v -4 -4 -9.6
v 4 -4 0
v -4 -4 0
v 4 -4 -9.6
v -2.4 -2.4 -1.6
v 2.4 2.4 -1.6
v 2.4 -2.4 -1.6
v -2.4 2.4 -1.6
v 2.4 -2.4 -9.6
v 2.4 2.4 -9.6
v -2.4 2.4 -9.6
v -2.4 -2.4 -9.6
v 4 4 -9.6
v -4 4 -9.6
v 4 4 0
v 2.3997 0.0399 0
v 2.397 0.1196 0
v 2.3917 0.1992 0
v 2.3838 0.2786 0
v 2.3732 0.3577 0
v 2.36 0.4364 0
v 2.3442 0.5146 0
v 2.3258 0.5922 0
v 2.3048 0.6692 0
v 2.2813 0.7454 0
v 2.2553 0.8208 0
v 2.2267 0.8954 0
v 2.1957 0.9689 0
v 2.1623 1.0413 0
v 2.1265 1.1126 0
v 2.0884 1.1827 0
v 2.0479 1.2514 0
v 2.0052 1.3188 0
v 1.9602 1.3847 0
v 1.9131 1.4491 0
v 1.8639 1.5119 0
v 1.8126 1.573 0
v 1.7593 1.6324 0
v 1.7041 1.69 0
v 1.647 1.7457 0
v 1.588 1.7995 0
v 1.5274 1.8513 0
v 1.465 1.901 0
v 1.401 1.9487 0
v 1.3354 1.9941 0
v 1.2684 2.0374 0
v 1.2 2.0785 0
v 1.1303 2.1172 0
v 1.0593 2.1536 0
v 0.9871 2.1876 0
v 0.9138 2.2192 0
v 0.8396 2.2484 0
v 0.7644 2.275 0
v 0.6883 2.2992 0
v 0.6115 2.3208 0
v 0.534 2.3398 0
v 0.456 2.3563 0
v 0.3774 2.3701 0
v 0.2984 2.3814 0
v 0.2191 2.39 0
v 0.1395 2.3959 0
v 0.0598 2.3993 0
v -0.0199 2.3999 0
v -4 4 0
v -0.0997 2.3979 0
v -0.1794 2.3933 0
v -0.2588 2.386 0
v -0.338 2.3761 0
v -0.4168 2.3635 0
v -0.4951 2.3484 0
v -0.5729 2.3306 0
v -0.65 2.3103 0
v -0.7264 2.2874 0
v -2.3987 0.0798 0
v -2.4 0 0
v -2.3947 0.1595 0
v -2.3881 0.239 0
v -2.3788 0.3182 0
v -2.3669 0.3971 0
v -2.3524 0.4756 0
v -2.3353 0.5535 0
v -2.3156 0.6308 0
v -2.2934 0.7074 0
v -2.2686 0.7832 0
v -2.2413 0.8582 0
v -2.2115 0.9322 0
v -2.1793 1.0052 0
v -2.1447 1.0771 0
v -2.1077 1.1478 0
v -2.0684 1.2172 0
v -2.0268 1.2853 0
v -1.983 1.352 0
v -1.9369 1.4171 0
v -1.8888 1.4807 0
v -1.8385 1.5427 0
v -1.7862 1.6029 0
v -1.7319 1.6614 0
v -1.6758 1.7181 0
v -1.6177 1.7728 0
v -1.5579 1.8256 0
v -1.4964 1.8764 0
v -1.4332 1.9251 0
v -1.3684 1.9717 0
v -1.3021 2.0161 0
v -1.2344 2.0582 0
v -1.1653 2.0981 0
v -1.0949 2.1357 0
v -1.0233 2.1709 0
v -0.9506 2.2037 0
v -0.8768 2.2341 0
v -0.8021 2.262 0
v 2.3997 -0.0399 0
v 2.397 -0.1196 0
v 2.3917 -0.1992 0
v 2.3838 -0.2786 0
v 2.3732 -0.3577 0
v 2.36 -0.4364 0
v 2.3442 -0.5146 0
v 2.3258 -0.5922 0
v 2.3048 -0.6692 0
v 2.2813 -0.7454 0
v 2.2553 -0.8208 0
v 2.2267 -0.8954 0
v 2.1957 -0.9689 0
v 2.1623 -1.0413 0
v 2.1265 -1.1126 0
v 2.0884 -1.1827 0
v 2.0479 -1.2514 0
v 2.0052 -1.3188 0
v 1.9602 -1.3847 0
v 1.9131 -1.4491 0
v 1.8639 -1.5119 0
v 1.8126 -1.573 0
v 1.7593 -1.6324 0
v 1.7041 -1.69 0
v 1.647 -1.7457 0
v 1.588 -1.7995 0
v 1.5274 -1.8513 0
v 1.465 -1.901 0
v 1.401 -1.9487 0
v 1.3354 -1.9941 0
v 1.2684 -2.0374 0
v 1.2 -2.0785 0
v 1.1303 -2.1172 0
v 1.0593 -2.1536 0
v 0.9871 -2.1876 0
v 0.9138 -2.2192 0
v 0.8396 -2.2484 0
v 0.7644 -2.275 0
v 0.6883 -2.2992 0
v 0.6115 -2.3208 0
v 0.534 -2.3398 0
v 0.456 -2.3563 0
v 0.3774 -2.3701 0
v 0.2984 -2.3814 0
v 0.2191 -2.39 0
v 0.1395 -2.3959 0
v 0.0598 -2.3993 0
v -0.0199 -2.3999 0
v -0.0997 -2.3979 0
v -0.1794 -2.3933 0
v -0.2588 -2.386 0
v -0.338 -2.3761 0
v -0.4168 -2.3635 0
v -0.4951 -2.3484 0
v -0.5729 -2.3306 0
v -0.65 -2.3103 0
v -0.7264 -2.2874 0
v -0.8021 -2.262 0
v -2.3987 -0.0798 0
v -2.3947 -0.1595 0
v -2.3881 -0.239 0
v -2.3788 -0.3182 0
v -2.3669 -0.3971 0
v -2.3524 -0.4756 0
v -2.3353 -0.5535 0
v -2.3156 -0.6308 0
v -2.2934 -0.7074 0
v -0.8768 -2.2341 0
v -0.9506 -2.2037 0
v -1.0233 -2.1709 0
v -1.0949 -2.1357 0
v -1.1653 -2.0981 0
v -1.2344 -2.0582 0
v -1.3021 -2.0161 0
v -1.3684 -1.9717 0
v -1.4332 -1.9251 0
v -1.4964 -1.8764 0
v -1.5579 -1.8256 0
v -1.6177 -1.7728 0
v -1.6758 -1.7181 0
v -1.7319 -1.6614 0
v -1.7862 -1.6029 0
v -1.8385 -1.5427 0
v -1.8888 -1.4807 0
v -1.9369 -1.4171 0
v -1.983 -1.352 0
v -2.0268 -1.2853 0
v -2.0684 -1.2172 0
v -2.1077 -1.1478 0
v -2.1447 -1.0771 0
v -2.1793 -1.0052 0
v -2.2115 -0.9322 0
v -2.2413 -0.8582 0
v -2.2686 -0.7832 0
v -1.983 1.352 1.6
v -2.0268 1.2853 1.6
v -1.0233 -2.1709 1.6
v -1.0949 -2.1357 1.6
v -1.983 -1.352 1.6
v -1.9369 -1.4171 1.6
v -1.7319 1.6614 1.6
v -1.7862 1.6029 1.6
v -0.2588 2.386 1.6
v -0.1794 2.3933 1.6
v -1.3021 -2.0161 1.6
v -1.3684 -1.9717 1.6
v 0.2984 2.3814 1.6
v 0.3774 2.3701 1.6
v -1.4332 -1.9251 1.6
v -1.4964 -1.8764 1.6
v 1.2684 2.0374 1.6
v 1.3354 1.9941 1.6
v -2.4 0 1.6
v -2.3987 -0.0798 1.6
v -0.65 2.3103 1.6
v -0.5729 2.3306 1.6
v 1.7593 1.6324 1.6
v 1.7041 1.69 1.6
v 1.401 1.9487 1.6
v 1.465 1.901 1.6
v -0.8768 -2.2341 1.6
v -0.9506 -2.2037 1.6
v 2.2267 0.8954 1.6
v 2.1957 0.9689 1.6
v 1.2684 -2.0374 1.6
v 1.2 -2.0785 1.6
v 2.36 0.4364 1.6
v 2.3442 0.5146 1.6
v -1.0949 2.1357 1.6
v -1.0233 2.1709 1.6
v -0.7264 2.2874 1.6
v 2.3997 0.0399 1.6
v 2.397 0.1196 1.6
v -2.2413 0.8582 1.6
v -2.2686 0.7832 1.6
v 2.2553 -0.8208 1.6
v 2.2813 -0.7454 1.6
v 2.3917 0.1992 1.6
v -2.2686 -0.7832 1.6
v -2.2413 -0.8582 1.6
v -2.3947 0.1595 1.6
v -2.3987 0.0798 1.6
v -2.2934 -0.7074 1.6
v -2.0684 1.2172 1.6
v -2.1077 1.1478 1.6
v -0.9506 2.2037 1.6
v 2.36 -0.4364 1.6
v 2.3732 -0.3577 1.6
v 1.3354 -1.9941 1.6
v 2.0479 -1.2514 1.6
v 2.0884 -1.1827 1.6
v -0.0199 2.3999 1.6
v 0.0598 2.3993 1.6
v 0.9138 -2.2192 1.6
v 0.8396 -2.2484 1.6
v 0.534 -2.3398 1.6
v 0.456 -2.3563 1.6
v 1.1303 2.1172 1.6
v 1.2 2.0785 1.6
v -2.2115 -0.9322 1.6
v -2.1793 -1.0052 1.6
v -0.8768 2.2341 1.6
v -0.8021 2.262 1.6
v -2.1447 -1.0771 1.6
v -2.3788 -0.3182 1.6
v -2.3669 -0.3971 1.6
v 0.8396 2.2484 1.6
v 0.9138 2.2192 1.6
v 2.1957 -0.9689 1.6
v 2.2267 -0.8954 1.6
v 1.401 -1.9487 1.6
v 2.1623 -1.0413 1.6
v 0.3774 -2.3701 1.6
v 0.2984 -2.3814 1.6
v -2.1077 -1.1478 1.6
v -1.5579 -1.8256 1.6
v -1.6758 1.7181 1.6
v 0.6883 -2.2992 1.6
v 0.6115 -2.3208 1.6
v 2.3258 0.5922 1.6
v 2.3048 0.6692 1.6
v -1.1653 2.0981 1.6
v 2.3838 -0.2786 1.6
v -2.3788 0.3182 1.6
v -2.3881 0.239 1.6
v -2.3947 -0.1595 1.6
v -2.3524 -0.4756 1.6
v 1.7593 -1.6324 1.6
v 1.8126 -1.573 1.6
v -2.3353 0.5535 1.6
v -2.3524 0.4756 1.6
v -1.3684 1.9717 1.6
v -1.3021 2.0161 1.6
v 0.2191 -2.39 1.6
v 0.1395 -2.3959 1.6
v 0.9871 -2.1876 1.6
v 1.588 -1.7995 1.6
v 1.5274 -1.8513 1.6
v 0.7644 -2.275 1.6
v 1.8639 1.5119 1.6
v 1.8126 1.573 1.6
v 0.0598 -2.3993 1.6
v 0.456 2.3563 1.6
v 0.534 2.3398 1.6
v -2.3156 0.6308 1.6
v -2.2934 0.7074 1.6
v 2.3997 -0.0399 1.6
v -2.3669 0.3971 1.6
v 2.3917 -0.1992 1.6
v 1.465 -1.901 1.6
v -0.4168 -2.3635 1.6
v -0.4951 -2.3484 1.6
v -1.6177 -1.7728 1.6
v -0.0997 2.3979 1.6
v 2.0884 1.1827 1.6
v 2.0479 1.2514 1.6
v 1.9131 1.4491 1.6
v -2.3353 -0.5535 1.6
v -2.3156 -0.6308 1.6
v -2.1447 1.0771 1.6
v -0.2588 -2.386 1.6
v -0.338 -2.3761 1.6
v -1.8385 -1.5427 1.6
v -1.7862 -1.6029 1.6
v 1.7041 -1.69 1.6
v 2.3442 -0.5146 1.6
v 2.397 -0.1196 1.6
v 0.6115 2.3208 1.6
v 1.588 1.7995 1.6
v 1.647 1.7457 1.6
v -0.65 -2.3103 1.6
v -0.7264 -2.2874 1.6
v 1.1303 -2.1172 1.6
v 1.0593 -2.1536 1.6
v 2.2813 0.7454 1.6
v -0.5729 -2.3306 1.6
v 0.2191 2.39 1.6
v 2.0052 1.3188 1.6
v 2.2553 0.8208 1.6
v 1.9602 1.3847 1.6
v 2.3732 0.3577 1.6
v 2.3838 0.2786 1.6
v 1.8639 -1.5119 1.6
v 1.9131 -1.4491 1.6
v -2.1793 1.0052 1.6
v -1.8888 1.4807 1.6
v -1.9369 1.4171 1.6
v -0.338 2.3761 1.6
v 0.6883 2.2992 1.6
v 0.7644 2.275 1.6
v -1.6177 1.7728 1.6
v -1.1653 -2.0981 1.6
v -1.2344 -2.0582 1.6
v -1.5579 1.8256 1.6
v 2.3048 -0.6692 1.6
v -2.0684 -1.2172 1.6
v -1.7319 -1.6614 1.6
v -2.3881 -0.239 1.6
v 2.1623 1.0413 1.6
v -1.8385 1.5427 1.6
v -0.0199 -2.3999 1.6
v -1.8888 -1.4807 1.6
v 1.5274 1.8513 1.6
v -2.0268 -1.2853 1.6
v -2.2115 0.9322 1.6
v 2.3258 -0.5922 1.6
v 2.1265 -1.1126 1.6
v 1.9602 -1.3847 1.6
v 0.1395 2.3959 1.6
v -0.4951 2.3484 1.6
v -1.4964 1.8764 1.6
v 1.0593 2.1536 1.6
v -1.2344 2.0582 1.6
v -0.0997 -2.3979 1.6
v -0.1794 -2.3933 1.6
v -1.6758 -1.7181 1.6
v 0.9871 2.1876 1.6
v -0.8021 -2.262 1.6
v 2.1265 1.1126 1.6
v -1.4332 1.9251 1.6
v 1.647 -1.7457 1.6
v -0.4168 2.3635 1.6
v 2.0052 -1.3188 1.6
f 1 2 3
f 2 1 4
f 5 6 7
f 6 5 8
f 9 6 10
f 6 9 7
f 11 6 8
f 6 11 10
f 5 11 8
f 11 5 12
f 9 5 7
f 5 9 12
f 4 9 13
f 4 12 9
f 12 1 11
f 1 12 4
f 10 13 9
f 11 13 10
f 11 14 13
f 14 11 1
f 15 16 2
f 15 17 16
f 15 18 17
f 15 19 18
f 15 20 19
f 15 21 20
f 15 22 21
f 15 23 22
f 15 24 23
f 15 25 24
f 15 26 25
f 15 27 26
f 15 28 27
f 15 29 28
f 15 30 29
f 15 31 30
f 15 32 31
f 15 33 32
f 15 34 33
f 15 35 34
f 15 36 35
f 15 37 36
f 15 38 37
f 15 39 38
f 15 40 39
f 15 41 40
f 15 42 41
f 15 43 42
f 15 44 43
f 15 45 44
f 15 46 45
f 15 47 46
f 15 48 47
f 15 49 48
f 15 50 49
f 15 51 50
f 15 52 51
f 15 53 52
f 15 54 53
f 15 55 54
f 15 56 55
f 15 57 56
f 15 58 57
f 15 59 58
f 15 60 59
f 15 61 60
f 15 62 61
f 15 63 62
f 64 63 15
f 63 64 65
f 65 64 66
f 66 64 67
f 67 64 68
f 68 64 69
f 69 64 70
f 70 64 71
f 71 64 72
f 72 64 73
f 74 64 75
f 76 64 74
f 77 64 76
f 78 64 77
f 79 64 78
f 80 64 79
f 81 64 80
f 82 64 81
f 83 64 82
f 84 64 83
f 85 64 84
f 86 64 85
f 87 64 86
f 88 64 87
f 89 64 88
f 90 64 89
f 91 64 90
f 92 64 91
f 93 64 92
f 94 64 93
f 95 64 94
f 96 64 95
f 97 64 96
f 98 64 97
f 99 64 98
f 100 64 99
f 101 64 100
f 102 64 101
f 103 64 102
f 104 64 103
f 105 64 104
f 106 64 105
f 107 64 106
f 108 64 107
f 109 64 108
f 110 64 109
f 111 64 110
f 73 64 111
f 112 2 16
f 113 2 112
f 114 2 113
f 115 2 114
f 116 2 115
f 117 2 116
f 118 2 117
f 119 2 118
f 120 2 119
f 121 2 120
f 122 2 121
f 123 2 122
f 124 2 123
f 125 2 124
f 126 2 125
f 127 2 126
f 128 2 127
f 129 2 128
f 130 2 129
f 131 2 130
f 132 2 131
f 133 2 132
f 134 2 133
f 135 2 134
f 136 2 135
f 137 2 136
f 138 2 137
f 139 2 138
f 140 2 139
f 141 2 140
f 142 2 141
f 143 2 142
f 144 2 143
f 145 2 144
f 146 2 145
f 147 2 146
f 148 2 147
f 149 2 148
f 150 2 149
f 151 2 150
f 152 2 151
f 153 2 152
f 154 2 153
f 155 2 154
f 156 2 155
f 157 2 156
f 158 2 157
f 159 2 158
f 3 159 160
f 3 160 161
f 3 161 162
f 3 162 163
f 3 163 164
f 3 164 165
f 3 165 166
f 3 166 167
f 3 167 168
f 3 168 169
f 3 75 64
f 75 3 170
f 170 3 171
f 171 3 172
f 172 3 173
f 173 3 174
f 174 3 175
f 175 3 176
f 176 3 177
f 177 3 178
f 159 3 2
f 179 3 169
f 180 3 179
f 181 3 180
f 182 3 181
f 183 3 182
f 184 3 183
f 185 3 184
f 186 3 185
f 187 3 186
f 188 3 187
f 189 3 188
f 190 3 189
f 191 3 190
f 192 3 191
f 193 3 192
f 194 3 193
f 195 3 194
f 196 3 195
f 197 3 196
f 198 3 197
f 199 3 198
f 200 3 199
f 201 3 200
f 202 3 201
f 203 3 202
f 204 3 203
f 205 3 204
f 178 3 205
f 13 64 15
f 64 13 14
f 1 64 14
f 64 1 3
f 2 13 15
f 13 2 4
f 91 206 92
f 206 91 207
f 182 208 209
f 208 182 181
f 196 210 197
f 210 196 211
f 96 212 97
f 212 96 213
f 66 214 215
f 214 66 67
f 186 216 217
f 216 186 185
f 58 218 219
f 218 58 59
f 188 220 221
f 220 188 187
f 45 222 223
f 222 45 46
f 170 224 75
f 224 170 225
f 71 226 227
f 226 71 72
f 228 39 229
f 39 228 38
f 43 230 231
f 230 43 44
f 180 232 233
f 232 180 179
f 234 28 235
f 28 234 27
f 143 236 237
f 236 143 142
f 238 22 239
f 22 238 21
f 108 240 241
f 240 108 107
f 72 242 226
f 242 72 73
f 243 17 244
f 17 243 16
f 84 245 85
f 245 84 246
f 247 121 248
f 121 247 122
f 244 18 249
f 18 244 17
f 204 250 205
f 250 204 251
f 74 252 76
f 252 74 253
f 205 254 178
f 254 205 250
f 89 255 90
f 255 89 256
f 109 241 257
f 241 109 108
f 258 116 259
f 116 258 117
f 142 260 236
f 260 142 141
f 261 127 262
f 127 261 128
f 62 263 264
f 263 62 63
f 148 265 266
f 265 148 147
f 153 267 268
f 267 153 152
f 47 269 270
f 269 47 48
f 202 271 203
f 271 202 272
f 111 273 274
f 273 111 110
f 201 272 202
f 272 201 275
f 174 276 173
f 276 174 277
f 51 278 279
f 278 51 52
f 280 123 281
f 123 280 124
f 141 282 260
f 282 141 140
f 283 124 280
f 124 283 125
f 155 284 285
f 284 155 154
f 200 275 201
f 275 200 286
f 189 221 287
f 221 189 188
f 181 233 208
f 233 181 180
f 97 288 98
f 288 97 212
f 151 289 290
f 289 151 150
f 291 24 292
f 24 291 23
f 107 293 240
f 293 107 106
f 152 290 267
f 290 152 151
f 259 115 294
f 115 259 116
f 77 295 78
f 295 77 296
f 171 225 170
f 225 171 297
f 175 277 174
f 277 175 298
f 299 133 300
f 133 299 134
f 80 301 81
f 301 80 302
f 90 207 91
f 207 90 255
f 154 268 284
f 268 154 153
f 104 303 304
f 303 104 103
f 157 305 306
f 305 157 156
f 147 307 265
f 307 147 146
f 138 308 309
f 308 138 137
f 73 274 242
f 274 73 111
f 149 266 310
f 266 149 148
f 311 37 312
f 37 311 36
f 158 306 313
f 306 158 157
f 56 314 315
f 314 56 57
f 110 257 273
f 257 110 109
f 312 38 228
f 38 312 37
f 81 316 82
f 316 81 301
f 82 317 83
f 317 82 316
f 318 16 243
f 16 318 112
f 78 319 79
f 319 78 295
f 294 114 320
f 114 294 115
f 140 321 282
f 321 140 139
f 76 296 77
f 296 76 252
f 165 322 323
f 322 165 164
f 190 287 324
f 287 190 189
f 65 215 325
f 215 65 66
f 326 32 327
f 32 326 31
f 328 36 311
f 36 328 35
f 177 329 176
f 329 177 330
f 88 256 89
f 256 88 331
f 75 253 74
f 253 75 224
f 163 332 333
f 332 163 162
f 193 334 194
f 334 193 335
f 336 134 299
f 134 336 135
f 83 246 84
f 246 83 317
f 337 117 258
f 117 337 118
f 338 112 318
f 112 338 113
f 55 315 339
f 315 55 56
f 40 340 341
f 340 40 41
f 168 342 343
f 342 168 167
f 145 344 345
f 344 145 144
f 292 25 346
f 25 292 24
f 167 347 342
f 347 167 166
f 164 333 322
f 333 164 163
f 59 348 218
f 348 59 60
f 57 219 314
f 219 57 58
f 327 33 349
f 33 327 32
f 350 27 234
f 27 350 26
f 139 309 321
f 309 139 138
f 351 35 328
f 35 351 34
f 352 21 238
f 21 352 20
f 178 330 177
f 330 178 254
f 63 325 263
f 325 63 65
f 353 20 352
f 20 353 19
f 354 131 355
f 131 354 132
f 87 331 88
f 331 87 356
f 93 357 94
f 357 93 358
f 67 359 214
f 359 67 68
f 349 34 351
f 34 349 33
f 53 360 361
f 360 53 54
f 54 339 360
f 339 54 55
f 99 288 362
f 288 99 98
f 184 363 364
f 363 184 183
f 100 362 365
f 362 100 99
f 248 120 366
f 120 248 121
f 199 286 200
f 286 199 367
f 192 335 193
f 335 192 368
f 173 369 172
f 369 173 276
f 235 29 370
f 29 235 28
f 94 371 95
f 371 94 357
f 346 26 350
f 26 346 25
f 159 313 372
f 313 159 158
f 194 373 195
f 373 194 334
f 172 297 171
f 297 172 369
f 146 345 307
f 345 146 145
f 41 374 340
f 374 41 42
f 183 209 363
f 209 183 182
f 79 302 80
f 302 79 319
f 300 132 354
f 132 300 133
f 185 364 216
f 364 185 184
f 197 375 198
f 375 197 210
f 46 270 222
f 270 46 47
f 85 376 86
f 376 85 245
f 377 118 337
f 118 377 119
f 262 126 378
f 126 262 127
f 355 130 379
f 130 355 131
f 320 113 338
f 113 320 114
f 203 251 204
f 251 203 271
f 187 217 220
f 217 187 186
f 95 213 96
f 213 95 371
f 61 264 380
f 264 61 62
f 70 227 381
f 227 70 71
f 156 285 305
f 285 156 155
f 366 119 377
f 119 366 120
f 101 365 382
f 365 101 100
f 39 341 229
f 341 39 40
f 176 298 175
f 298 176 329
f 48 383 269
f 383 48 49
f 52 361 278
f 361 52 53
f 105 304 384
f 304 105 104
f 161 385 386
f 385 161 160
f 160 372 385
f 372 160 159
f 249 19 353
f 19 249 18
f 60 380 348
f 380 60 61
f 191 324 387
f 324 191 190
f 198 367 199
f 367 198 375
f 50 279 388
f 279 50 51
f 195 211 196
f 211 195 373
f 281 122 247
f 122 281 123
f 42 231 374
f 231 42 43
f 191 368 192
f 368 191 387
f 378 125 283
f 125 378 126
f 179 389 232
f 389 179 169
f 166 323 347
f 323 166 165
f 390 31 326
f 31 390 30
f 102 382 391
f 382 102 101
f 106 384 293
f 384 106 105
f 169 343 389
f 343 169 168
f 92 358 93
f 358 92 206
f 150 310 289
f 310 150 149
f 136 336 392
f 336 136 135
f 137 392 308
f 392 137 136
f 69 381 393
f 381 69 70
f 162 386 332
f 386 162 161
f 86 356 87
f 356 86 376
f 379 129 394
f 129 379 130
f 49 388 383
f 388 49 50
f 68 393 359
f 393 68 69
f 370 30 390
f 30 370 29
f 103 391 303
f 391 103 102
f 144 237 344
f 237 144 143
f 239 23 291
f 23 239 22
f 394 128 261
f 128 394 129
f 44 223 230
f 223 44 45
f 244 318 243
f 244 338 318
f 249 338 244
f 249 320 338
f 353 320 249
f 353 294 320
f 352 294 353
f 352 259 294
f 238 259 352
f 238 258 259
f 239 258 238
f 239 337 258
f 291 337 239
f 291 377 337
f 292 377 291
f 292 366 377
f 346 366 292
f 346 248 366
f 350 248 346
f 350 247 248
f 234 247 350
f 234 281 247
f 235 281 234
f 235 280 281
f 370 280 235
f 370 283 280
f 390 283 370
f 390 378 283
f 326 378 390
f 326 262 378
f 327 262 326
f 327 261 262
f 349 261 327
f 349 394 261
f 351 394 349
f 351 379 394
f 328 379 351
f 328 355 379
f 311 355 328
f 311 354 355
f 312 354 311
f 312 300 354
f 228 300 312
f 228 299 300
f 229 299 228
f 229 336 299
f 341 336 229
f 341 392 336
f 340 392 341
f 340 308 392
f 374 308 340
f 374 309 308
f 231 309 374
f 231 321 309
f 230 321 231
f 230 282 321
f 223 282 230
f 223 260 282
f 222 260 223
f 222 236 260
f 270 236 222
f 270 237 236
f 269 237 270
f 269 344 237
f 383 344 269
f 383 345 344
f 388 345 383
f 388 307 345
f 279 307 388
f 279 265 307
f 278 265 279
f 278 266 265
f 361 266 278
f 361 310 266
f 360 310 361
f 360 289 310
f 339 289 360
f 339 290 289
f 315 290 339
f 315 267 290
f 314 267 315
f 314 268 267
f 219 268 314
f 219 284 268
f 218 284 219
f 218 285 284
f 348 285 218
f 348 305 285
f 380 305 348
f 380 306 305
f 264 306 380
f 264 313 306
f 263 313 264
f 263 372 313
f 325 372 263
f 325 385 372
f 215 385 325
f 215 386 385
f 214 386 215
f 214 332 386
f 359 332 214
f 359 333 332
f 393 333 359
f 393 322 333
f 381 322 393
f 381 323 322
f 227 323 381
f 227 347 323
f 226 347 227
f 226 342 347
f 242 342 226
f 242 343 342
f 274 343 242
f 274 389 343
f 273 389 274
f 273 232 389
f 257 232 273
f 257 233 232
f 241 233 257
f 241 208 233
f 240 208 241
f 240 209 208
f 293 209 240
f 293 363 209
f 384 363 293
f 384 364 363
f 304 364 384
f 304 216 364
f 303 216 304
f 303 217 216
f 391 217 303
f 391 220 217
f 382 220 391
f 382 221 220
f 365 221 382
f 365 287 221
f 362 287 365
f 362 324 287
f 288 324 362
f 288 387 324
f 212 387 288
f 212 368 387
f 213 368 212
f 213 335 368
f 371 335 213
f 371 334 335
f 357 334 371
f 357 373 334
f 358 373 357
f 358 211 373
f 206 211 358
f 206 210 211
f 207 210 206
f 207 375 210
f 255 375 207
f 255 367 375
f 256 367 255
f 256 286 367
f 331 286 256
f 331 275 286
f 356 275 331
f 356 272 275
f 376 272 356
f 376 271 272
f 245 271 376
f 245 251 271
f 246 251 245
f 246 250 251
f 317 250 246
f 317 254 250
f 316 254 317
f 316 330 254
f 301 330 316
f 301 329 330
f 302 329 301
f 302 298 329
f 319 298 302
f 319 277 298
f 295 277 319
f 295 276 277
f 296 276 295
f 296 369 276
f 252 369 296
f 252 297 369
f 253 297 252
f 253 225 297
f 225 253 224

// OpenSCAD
// file: ../p/4-4edge.scad
use <../lib.scad>
$fa=1; $fs=0.2;
function ldraw_lib__4_4edge(realsolid=false) = [
// 0 Circle 1.0
// 0 Name: 4-4edge.dat
// 0 Author: James Jessiman
// 0 !LDRAW_ORG Primitive UPDATE 2017-01
// 0 !LICENSE Licensed under CC BY 2.0 and CC BY 4.0 : see CAreadme.txt
// 
// 0 BFC CERTIFY CCW
  [0,"BFC","CERTIFY"],
  [0,"BFC","CCW"],
// 
// 0 !HISTORY 1998-12-15 [PTadmin] Official Update 1998-10
// 0 !HISTORY 2005-12-28 [PTadmin] Official Update 2005-01
// 0 !HISTORY 2007-06-24 [PTadmin] Header formatted for Contributor Agreement
// 0 !HISTORY 2008-07-01 [PTadmin] Official Update 2008-01
// 0 !HISTORY 2017-01-15 [Steffen] BFCed
// 0 !HISTORY 2017-12-30 [PTadmin] Official Update 2017-01
// 
// 
// 2 24 1 0 0 0.9239 0 0.3827
  [2,24,1,0,0,0.9239,0,0.3827],
// 2 24 0.9239 0 0.3827 0.7071 0 0.7071
  [2,24,0.9239,0,0.3827,0.7071,0,0.7071],
// 2 24 0.7071 0 0.7071 0.3827 0 0.9239
  [2,24,0.7071,0,0.7071,0.3827,0,0.9239],
// 2 24 0.3827 0 0.9239 0 0 1
  [2,24,0.3827,0,0.9239,0,0,1],
// 2 24 0 0 1 -0.3827 0 0.9239
  [2,24,0,0,1,-0.3827,0,0.9239],
// 2 24 -0.3827 0 0.9239 -0.7071 0 0.7071
  [2,24,-0.3827,0,0.9239,-0.7071,0,0.7071],
// 2 24 -0.7071 0 0.7071 -0.9239 0 0.3827
  [2,24,-0.7071,0,0.7071,-0.9239,0,0.3827],
// 2 24 -0.9239 0 0.3827 -1 0 -0
  [2,24,-0.9239,0,0.3827,-1,0,-0],
// 2 24 -1 0 -0 -0.9239 0 -0.3827
  [2,24,-1,0,-0,-0.9239,0,-0.3827],
// 2 24 -0.9239 0 -0.3827 -0.7071 0 -0.7071
  [2,24,-0.9239,0,-0.3827,-0.7071,0,-0.7071],
// 2 24 -0.7071 0 -0.7071 -0.3827 0 -0.9239
  [2,24,-0.7071,0,-0.7071,-0.3827,0,-0.9239],
// 2 24 -0.3827 0 -0.9239 0 0 -1
  [2,24,-0.3827,0,-0.9239,0,0,-1],
// 2 24 0 0 -1 0.3827 0 -0.9239
  [2,24,0,0,-1,0.3827,0,-0.9239],
// 2 24 0.3827 0 -0.9239 0.7071 0 -0.7071
  [2,24,0.3827,0,-0.9239,0.7071,0,-0.7071],
// 2 24 0.7071 0 -0.7071 0.9239 0 -0.3827
  [2,24,0.7071,0,-0.7071,0.9239,0,-0.3827],
// 2 24 0.9239 0 -0.3827 1 0 0
  [2,24,0.9239,0,-0.3827,1,0,0],
];
module ldraw_lib__4_4edge(step=0, col=false, unit=2/5, alt=false, line=0.2, solid=!$preview)
    makepoly(ldraw_lib__4_4edge(solid), step=step, col=col, unit=unit, alt=alt, line=line, solid=solid);
ldraw_lib__4_4edge(line=0.2);
// file: ../p/4-4disc.scad
use <../lib.scad>
$fa=1; $fs=0.2;
function ldraw_lib__4_4disc(realsolid=false) = [
// 0 Disc 1.0
// 0 Name: 4-4disc.dat
// 0 Author: James Jessiman
// 0 !LDRAW_ORG Primitive UPDATE 2002-02
// 0 !LICENSE Licensed under CC BY 2.0 and CC BY 4.0 : see CAreadme.txt
// 
// 0 BFC CERTIFY CCW
  [0,"BFC","CERTIFY"],
  [0,"BFC","CCW"],
// 
// 0 !HISTORY 1998-12-15 [PTadmin] Official Update 1998-10
// 0 !HISTORY 2002-03-23 [sbliss] Added BFC statement
// 0 !HISTORY 2002-04-25 [PTadmin] Official Update 2002-02
// 0 !HISTORY 2007-06-24 [PTadmin] Header formatted for Contributor Agreement
// 0 !HISTORY 2008-07-01 [PTadmin] Official Update 2008-01
// 
// 
// 3 16 0 0 0 1 0 0 0.9239 0 0.3827
  [3,16,0,0,0,1,0,0,0.9239,0,0.3827],
// 3 16 0 0 0 0.9239 0 0.3827 0.7071 0 0.7071
  [3,16,0,0,0,0.9239,0,0.3827,0.7071,0,0.7071],
// 3 16 0 0 0 0.7071 0 0.7071 0.3827 0 0.9239
  [3,16,0,0,0,0.7071,0,0.7071,0.3827,0,0.9239],
// 3 16 0 0 0 0.3827 0 0.9239 0 0 1
  [3,16,0,0,0,0.3827,0,0.9239,0,0,1],
// 3 16 0 0 0 0 0 1 -0.3827 0 0.9239
  [3,16,0,0,0,0,0,1,-0.3827,0,0.9239],
// 3 16 0 0 0 -0.3827 0 0.9239 -0.7071 0 0.7071
  [3,16,0,0,0,-0.3827,0,0.9239,-0.7071,0,0.7071],
// 3 16 0 0 0 -0.7071 0 0.7071 -0.9239 0 0.3827
  [3,16,0,0,0,-0.7071,0,0.7071,-0.9239,0,0.3827],
// 3 16 0 0 0 -0.9239 0 0.3827 -1 0 -0
  [3,16,0,0,0,-0.9239,0,0.3827,-1,0,-0],
// 3 16 0 0 0 -1 0 -0 -0.9239 0 -0.3827
  [3,16,0,0,0,-1,0,-0,-0.9239,0,-0.3827],
// 3 16 0 0 0 -0.9239 0 -0.3827 -0.7071 0 -0.7071
  [3,16,0,0,0,-0.9239,0,-0.3827,-0.7071,0,-0.7071],
// 3 16 0 0 0 -0.7071 0 -0.7071 -0.3827 0 -0.9239
  [3,16,0,0,0,-0.7071,0,-0.7071,-0.3827,0,-0.9239],
// 3 16 0 0 0 -0.3827 0 -0.9239 0 0 -1
  [3,16,0,0,0,-0.3827,0,-0.9239,0,0,-1],
// 3 16 0 0 0 0 0 -1 0.3827 0 -0.9239
  [3,16,0,0,0,0,0,-1,0.3827,0,-0.9239],
// 3 16 0 0 0 0.3827 0 -0.9239 0.7071 0 -0.7071
  [3,16,0,0,0,0.3827,0,-0.9239,0.7071,0,-0.7071],
// 3 16 0 0 0 0.7071 0 -0.7071 0.9239 0 -0.3827
  [3,16,0,0,0,0.7071,0,-0.7071,0.9239,0,-0.3827],
// 3 16 0 0 0 0.9239 0 -0.3827 1 0 0
  [3,16,0,0,0,0.9239,0,-0.3827,1,0,0],
// 0
];
module ldraw_lib__4_4disc(step=0, col=false, unit=2/5, alt=false, line=0.2, solid=!$preview)
    makepoly(ldraw_lib__4_4disc(solid), step=step, col=col, unit=unit, alt=alt, line=line, solid=solid);
ldraw_lib__4_4disc(line=0.2);
// file: ../p/4-4cyli.scad
use <../lib.scad>
$fa=1; $fs=0.2;
function ldraw_lib__4_4cyli(realsolid=false) = [
// 0 Cylinder 1.0
// 0 Name: 4-4cyli.dat
// 0 Author: James Jessiman
// 0 !LDRAW_ORG Primitive UPDATE 2005-01
// 0 !LICENSE Licensed under CC BY 2.0 and CC BY 4.0 : see CAreadme.txt
// 
// 0 BFC CERTIFY CCW
  [0,"BFC","CERTIFY"],
  [0,"BFC","CCW"],
// 
// 0 !HISTORY 1998-12-15 [PTadmin] Official Update 1998-10
// 0 !HISTORY 2002-03-23 [sbliss] Added BFC statement; merged headers from files in distributions LDraw 0.27 and Complete.
// 0 !HISTORY 2002-04-25 [PTadmin] Official Update 2002-02
// 0 !HISTORY 2004-12-14 [guyvivan] BFC CCW
// 0 !HISTORY 2005-12-28 [PTadmin] Official Update 2005-01
// 0 !HISTORY 2007-06-24 [PTadmin] Header formatted for Contributor Agreement
// 0 !HISTORY 2008-07-01 [PTadmin] Official Update 2008-01
// 
// 
// 4 16 1 1 0 0.9239 1 0.3827 0.9239 0 0.3827 1 0 0
  [4,16,1,1,0,0.9239,1,0.3827,0.9239,0,0.3827,1,0,0],
// 5 24 1 0 0 1 1 0 0.9239 0 0.3827 0.9239 0 -0.3827
  [5,24,1,0,0,1,1,0,0.9239,0,0.3827,0.9239,0,-0.3827],
// 4 16 0.9239 1 0.3827 0.7071 1 0.7071 0.7071 0 0.7071 0.9239 0 0.3827
  [4,16,0.9239,1,0.3827,0.7071,1,0.7071,0.7071,0,0.7071,0.9239,0,0.3827],
// 5 24 0.9239 0 0.3827 0.9239 1 0.3827 0.7071 0 0.7071 1 0 0
  [5,24,0.9239,0,0.3827,0.9239,1,0.3827,0.7071,0,0.7071,1,0,0],
// 4 16 0.7071 1 0.7071 0.3827 1 0.9239 0.3827 0 0.9239 0.7071 0 0.7071
  [4,16,0.7071,1,0.7071,0.3827,1,0.9239,0.3827,0,0.9239,0.7071,0,0.7071],
// 5 24 0.7071 0 0.7071 0.7071 1 0.7071 0.3827 0 0.9239 0.9239 0 0.3827
  [5,24,0.7071,0,0.7071,0.7071,1,0.7071,0.3827,0,0.9239,0.9239,0,0.3827],
// 4 16 0.3827 1 0.9239 0 1 1 0 0 1 0.3827 0 0.9239
  [4,16,0.3827,1,0.9239,0,1,1,0,0,1,0.3827,0,0.9239],
// 5 24 0.3827 0 0.9239 0.3827 1 0.9239 0 0 1 0.7071 0 0.7071
  [5,24,0.3827,0,0.9239,0.3827,1,0.9239,0,0,1,0.7071,0,0.7071],
// 4 16 0 1 1 -0.3827 1 0.9239 -0.3827 0 0.9239 0 0 1
  [4,16,0,1,1,-0.3827,1,0.9239,-0.3827,0,0.9239,0,0,1],
// 5 24 0 0 1 0 1 1 -0.3827 0 0.9239 0.3827 0 0.9239
  [5,24,0,0,1,0,1,1,-0.3827,0,0.9239,0.3827,0,0.9239],
// 4 16 -0.3827 1 0.9239 -0.7071 1 0.7071 -0.7071 0 0.7071 -0.3827 0 0.9239
  [4,16,-0.3827,1,0.9239,-0.7071,1,0.7071,-0.7071,0,0.7071,-0.3827,0,0.9239],
// 5 24 -0.3827 0 0.9239 -0.3827 1 0.9239 -0.7071 0 0.7071 0 0 1
  [5,24,-0.3827,0,0.9239,-0.3827,1,0.9239,-0.7071,0,0.7071,0,0,1],
// 4 16 -0.7071 1 0.7071 -0.9239 1 0.3827 -0.9239 0 0.3827 -0.7071 0 0.7071
  [4,16,-0.7071,1,0.7071,-0.9239,1,0.3827,-0.9239,0,0.3827,-0.7071,0,0.7071],
// 5 24 -0.7071 0 0.7071 -0.7071 1 0.7071 -0.9239 0 0.3827 -0.3827 0 0.9239
  [5,24,-0.7071,0,0.7071,-0.7071,1,0.7071,-0.9239,0,0.3827,-0.3827,0,0.9239],
// 4 16 -0.9239 1 0.3827 -1 1 0 -1 0 0 -0.9239 0 0.3827
  [4,16,-0.9239,1,0.3827,-1,1,0,-1,0,0,-0.9239,0,0.3827],
// 5 24 -0.9239 0 0.3827 -0.9239 1 0.3827 -1 0 0 -0.7071 0 0.7071
  [5,24,-0.9239,0,0.3827,-0.9239,1,0.3827,-1,0,0,-0.7071,0,0.7071],
// 4 16 -1 1 0 -0.9239 1 -0.3827 -0.9239 0 -0.3827 -1 0 0
  [4,16,-1,1,0,-0.9239,1,-0.3827,-0.9239,0,-0.3827,-1,0,0],
// 5 24 -1 0 0 -1 1 0 -0.9239 0 -0.3827 -0.9239 0 0.3827
  [5,24,-1,0,0,-1,1,0,-0.9239,0,-0.3827,-0.9239,0,0.3827],
// 4 16 -0.9239 1 -0.3827 -0.7071 1 -0.7071 -0.7071 0 -0.7071 -0.9239 0 -0.3827
  [4,16,-0.9239,1,-0.3827,-0.7071,1,-0.7071,-0.7071,0,-0.7071,-0.9239,0,-0.3827],
// 5 24 -0.9239 0 -0.3827 -0.9239 1 -0.3827 -0.7071 0 -0.7071 -1 0 0
  [5,24,-0.9239,0,-0.3827,-0.9239,1,-0.3827,-0.7071,0,-0.7071,-1,0,0],
// 4 16 -0.7071 1 -0.7071 -0.3827 1 -0.9239 -0.3827 0 -0.9239 -0.7071 0 -0.7071
  [4,16,-0.7071,1,-0.7071,-0.3827,1,-0.9239,-0.3827,0,-0.9239,-0.7071,0,-0.7071],
// 5 24 -0.7071 0 -0.7071 -0.7071 1 -0.7071 -0.3827 0 -0.9239 -0.9239 0 -0.3827
  [5,24,-0.7071,0,-0.7071,-0.7071,1,-0.7071,-0.3827,0,-0.9239,-0.9239,0,-0.3827],
// 4 16 -0.3827 1 -0.9239 0 1 -1 0 0 -1 -0.3827 0 -0.9239
  [4,16,-0.3827,1,-0.9239,0,1,-1,0,0,-1,-0.3827,0,-0.9239],
// 5 24 -0.3827 0 -0.9239 -0.3827 1 -0.9239 0 0 -1 -0.7071 0 -0.7071
  [5,24,-0.3827,0,-0.9239,-0.3827,1,-0.9239,0,0,-1,-0.7071,0,-0.7071],
// 4 16 0 1 -1 0.3827 1 -0.9239 0.3827 0 -0.9239 0 0 -1
  [4,16,0,1,-1,0.3827,1,-0.9239,0.3827,0,-0.9239,0,0,-1],
// 5 24 0 0 -1 0 1 -1 0.3827 0 -0.9239 -0.3827 0 -0.9239
  [5,24,0,0,-1,0,1,-1,0.3827,0,-0.9239,-0.3827,0,-0.9239],
// 4 16 0.3827 1 -0.9239 0.7071 1 -0.7071 0.7071 0 -0.7071 0.3827 0 -0.9239
  [4,16,0.3827,1,-0.9239,0.7071,1,-0.7071,0.7071,0,-0.7071,0.3827,0,-0.9239],
// 5 24 0.3827 0 -0.9239 0.3827 1 -0.9239 0.7071 0 -0.7071 0 0 -1
  [5,24,0.3827,0,-0.9239,0.3827,1,-0.9239,0.7071,0,-0.7071,0,0,-1],
// 4 16 0.7071 1 -0.7071 0.9239 1 -0.3827 0.9239 0 -0.3827 0.7071 0 -0.7071
  [4,16,0.7071,1,-0.7071,0.9239,1,-0.3827,0.9239,0,-0.3827,0.7071,0,-0.7071],
// 5 24 0.7071 0 -0.7071 0.7071 1 -0.7071 0.9239 0 -0.3827 0.3827 0 -0.9239
  [5,24,0.7071,0,-0.7071,0.7071,1,-0.7071,0.9239,0,-0.3827,0.3827,0,-0.9239],
// 4 16 0.9239 1 -0.3827 1 1 0 1 0 0 0.9239 0 -0.3827
  [4,16,0.9239,1,-0.3827,1,1,0,1,0,0,0.9239,0,-0.3827],
// 5 24 0.9239 0 -0.3827 0.9239 1 -0.3827 1 0 0 0.7071 0 -0.7071
  [5,24,0.9239,0,-0.3827,0.9239,1,-0.3827,1,0,0,0.7071,0,-0.7071],
// 0
];
module ldraw_lib__4_4cyli(step=0, col=false, unit=2/5, alt=false, line=0.2, solid=!$preview)
    makepoly(ldraw_lib__4_4cyli(solid), step=step, col=col, unit=unit, alt=alt, line=line, solid=solid);
ldraw_lib__4_4cyli(line=0.2);
// file: ../p/stud3.scad
use <../lib.scad>
use <4-4cyli.scad>
use <4-4disc.scad>
use <4-4edge.scad>
$fa=1; $fs=0.2;
function ldraw_lib__stud3(realsolid=false) = realsolid ? 
    [openscad(translate([0,0,-eps()], o=cylinder(4+eps(), r=4)),2)] : [
// 0 Stud Tube Solid
// 0 Name: stud3.dat
// 0 Author: James Jessiman
// 0 !LDRAW_ORG Primitive UPDATE 2012-01
// 0 !LICENSE Licensed under CC BY 2.0 and CC BY 4.0 : see CAreadme.txt
// 
// 0 BFC CERTIFY CCW
  [0,"BFC","CERTIFY"],
  [0,"BFC","CCW"],
// 
// 0 !HISTORY 2002-04-04 [sbliss] Modified for BFC compliance
// 0 !HISTORY 2002-04-25 [PTadmin] Official Update 2002-02
// 0 !HISTORY 2007-06-24 [PTadmin] Header formatted for Contributor Agreement
// 0 !HISTORY 2008-07-01 [PTadmin] Official Update 2008-01
// 0 !HISTORY 2012-02-16 [Philo] Changed to CCW
// 0 !HISTORY 2012-03-30 [PTadmin] Official Update 2012-01
// 
// 
// 1 16 0 -4 0 4 0 0 0 1 0 0 0 4 4-4edge.dat
  [1,16,0,-4,0,4,0,0,0,1,0,0,0,4, ldraw_lib__4_4edge(realsolid)],
// 1 16 0 0 0 4 0 0 0 1 0 0 0 4 4-4edge.dat
  [1,16,0,0,0,4,0,0,0,1,0,0,0,4, ldraw_lib__4_4edge(realsolid)],
// 1 16 0 -4 0 4 0 0 0 1 0 0 0 4 4-4disc.dat
  [1,16,0,-4,0,4,0,0,0,1,0,0,0,4, ldraw_lib__4_4disc(realsolid)],
// 1 16 0 -4 0 4 0 0 0 4 0 0 0 4 4-4cyli.dat
  [1,16,0,-4,0,4,0,0,0,4,0,0,0,4, ldraw_lib__4_4cyli(realsolid)],
];
module ldraw_lib__stud3(step=0, col=false, unit=2/5, alt=false, line=0.2, solid=!$preview)
    makepoly(ldraw_lib__stud3(solid), step=step, col=col, unit=unit, alt=alt, line=line, solid=solid);
ldraw_lib__stud3(line=0.2);
// file: ../p/stud.scad
use <../lib.scad>
use <4-4cyli.scad>
use <4-4disc.scad>
use <4-4edge.scad>
$fa=1; $fs=0.2;
function ldraw_lib__stud(realsolid=false) = realsolid ? 
    [openscad(translate([0,0,-eps()], o=cylinder(4+eps(), r=6)),2)] : [
// 0 Stud
// 0 Name: stud.dat
// 0 Author: James Jessiman
// 0 !LDRAW_ORG Primitive UPDATE 2012-01
// 0 !LICENSE Licensed under CC BY 2.0 and CC BY 4.0 : see CAreadme.txt
// 
// 0 BFC CERTIFY CCW
  [0,"BFC","CERTIFY"],
  [0,"BFC","CCW"],
// 
// 0 !HISTORY 2002-04-04 [sbliss] Modified for BFC compliance
// 0 !HISTORY 2002-04-25 [PTadmin] Official Update 2002-02
// 0 !HISTORY 2007-06-24 [PTadmin] Header formatted for Contributor Agreement
// 0 !HISTORY 2008-07-01 [PTadmin] Official Update 2008-01
// 0 !HISTORY 2012-02-16 [Philo] Changed to CCW
// 0 !HISTORY 2012-03-30 [PTadmin] Official Update 2012-01
// 
// 
// 1 16 0 0 0 6 0 0 0 1 0 0 0 6 4-4edge.dat
  [1,16,0,0,0,6,0,0,0,1,0,0,0,6, ldraw_lib__4_4edge(realsolid)],
// 1 16 0 -4 0 6 0 0 0 1 0 0 0 6 4-4edge.dat
  [1,16,0,-4,0,6,0,0,0,1,0,0,0,6, ldraw_lib__4_4edge(realsolid)],
// 1 16 0 0 0 6 0 0 0 -4 0 0 0 6 4-4cyli.dat
  [1,16,0,0,0,6,0,0,0,-4,0,0,0,6, ldraw_lib__4_4cyli(realsolid)],
// 1 16 0 -4 0 6 0 0 0 1 0 0 0 6 4-4disc.dat
  [1,16,0,-4,0,6,0,0,0,1,0,0,0,6, ldraw_lib__4_4disc(realsolid)],
];
module ldraw_lib__stud(step=0, col=false, unit=2/5, alt=false, line=0.2, solid=!$preview)
    makepoly(ldraw_lib__stud(solid), step=step, col=col, unit=unit, alt=alt, line=line, solid=solid);
ldraw_lib__stud(line=0.2);
// file: ../p/box5.scad
use <../lib.scad>
$fa=1; $fs=0.2;
function ldraw_lib__box5(realsolid=false) = [
// 0 Box with 5 Faces and All Edges
// 0 Name: box5.dat
// 0 Author: James Jessiman
// 0 !LDRAW_ORG Primitive UPDATE 2012-01
// 0 !LICENSE Licensed under CC BY 2.0 and CC BY 4.0 : see CAreadme.txt
// 
// 0 BFC CERTIFY CCW
  [0,"BFC","CERTIFY"],
  [0,"BFC","CCW"],
// 
// 0 !HISTORY 2002-04-03 [sbliss] Modified for BFC compliance
// 0 !HISTORY 2002-04-25 [PTadmin] Official Update 2002-02
// 0 !HISTORY 2007-06-24 [PTadmin] Header formatted for Contributor Agreement
// 0 !HISTORY 2008-07-01 [PTadmin] Official Update 2008-01
// 0 !HISTORY 2012-02-16 [Philo] Changed to CCW
// 0 !HISTORY 2012-03-30 [PTadmin] Official Update 2012-01
// 
// 
// 2 24 1 1 1 -1 1 1
  [2,24,1,1,1,-1,1,1],
// 2 24 -1 1 1 -1 1 -1
  [2,24,-1,1,1,-1,1,-1],
// 2 24 -1 1 -1 1 1 -1
  [2,24,-1,1,-1,1,1,-1],
// 2 24 1 1 -1 1 1 1
  [2,24,1,1,-1,1,1,1],
// 2 24 1 0 1 -1 0 1
  [2,24,1,0,1,-1,0,1],
// 2 24 -1 0 1 -1 0 -1
  [2,24,-1,0,1,-1,0,-1],
// 2 24 -1 0 -1 1 0 -1
  [2,24,-1,0,-1,1,0,-1],
// 2 24 1 0 -1 1 0 1
  [2,24,1,0,-1,1,0,1],
// 2 24 1 0 1 1 1 1
  [2,24,1,0,1,1,1,1],
// 2 24 -1 0 1 -1 1 1
  [2,24,-1,0,1,-1,1,1],
// 2 24 1 0 -1 1 1 -1
  [2,24,1,0,-1,1,1,-1],
// 2 24 -1 0 -1 -1 1 -1
  [2,24,-1,0,-1,-1,1,-1],
// 4 16 -1 1 1 1 1 1 1 1 -1 -1 1 -1
  [4,16,-1,1,1,1,1,1,1,1,-1,-1,1,-1],
// 4 16 -1 1 1 -1 0 1 1 0 1 1 1 1
  [4,16,-1,1,1,-1,0,1,1,0,1,1,1,1],
// 4 16 -1 1 -1 -1 0 -1 -1 0 1 -1 1 1
  [4,16,-1,1,-1,-1,0,-1,-1,0,1,-1,1,1],
// 4 16 1 1 -1 1 0 -1 -1 0 -1 -1 1 -1
  [4,16,1,1,-1,1,0,-1,-1,0,-1,-1,1,-1],
// 4 16 1 1 1 1 0 1 1 0 -1 1 1 -1
  [4,16,1,1,1,1,0,1,1,0,-1,1,1,-1],
];
module ldraw_lib__box5(step=0, col=false, unit=2/5, alt=false, line=0.2, solid=!$preview)
    makepoly(ldraw_lib__box5(solid), step=step, col=col, unit=unit, alt=alt, line=line, solid=solid);
ldraw_lib__box5(line=0.2);
// file: ../p/box4t.scad
use <../lib.scad>
$fa=1; $fs=0.2;
function ldraw_lib__box4t(realsolid=false) = [
// 0 Box with 4 Adjacent Faces and All Edges
// 0 Name: box4t.dat
// 0 Author: Tore Eriksson [Tore_Eriksson]
// 0 !LDRAW_ORG Primitive UPDATE 2003-02
// 0 !LICENSE Licensed under CC BY 2.0 and CC BY 4.0 : see CAreadme.txt
// 
// 0 BFC CERTIFY CCW
  [0,"BFC","CERTIFY"],
  [0,"BFC","CCW"],
// 
// 0 !HISTORY 1997-09-29 [PTadmin] Official Update 1997-15
// 0 !HISTORY 2002-08-31 [izanette] Modified with WINDZ for BFC compliance
// 0 !HISTORY 2003-08-01 [PTadmin] Official Update 2003-02
// 0 !HISTORY 2007-06-24 [PTadmin] Header formatted for Contributor Agreement
// 0 !HISTORY 2008-07-01 [PTadmin] Official Update 2008-01
// 
// 
// 2 24 1 1 1 -1 1 1
  [2,24,1,1,1,-1,1,1],
// 2 24 -1 1 1 -1 1 -1
  [2,24,-1,1,1,-1,1,-1],
// 2 24 -1 1 -1 1 1 -1
  [2,24,-1,1,-1,1,1,-1],
// 2 24 1 1 -1 1 1 1
  [2,24,1,1,-1,1,1,1],
// 2 24 1 0 1 -1 0 1
  [2,24,1,0,1,-1,0,1],
// 2 24 -1 0 1 -1 0 -1
  [2,24,-1,0,1,-1,0,-1],
// 2 24 -1 0 -1 1 0 -1
  [2,24,-1,0,-1,1,0,-1],
// 2 24 1 0 -1 1 0 1
  [2,24,1,0,-1,1,0,1],
// 2 24 1 0 1 1 1 1
  [2,24,1,0,1,1,1,1],
// 2 24 -1 0 1 -1 1 1
  [2,24,-1,0,1,-1,1,1],
// 2 24 1 0 -1 1 1 -1
  [2,24,1,0,-1,1,1,-1],
// 2 24 -1 0 -1 -1 1 -1
  [2,24,-1,0,-1,-1,1,-1],
// 4 16 1 1 1 1 1 -1 -1 1 -1 -1 1 1
  [4,16,1,1,1,1,1,-1,-1,1,-1,-1,1,1],
// 4 16 1 1 1 -1 1 1 -1 0 1 1 0 1
  [4,16,1,1,1,-1,1,1,-1,0,1,1,0,1],
// 4 16 -1 1 1 -1 1 -1 -1 0 -1 -1 0 1
  [4,16,-1,1,1,-1,1,-1,-1,0,-1,-1,0,1],
// 0 4 16 -1 1 -1 -1 0 -1 1 0 -1 1 1 -1
// 4 16 1 1 -1 1 1 1 1 0 1 1 0 -1
  [4,16,1,1,-1,1,1,1,1,0,1,1,0,-1],
// 0
];
module ldraw_lib__box4t(step=0, col=false, unit=2/5, alt=false, line=0.2, solid=!$preview)
    makepoly(ldraw_lib__box4t(solid), step=step, col=col, unit=unit, alt=alt, line=line, solid=solid);
ldraw_lib__box4t(line=0.2);
// file: s/3004s01.scad
use <../../lib.scad>
use <../../p/box4t.scad>
use <../../p/box5.scad>
use <../../p/stud.scad>
use <../../p/stud3.scad>
$fa=1; $fs=0.2;
function ldraw_lib__s__3004s01(realsolid=false) = [
// 0 ~Brick  1 x  2 without Front Face
// 0 Name: s\3004s01.dat
// 0 Author: James Jessiman
// 0 !LDRAW_ORG Subpart UPDATE 2003-03
// 0 !LICENSE Licensed under CC BY 2.0 and CC BY 4.0 : see CAreadme.txt
// 
// 0 BFC CERTIFY CCW
  [0,"BFC","CERTIFY"],
  [0,"BFC","CCW"],
// 
// 0 !HISTORY 2003-09-07 [jriley] Subfiling, BFC
// 0 !HISTORY 2003-12-19 [PTadmin] Official Update 2003-03
// 0 !HISTORY 2007-08-29 [PTadmin] Header formatted for Contributor Agreement
// 0 !HISTORY 2008-07-01 [PTadmin] Official Update 2008-01
// 
// 
// 1 16 0 4 0 1 0 0 0 -5 0 0 0 1 stud3.dat
  [1,16,0,4,0,1,0,0,0,-5,0,0,0,1, ldraw_lib__stud3(realsolid)],
// 0 BFC INVERTNEXT
  [0,"BFC","INVERTNEXT"],
// 1 16 0 24 0 16 0 0 0 -20 0 0 0 6 box5.dat
  [1,16,0,24,0,16,0,0,0,-20,0,0,0,6, ldraw_lib__box5(realsolid)],
// 4 16 20 24 10 16 24 6 -16 24 6 -20 24 10
  [4,16,20,24,10,16,24,6,-16,24,6,-20,24,10],
// 4 16 -20 24 10 -16 24 6 -16 24 -6 -20 24 -10
  [4,16,-20,24,10,-16,24,6,-16,24,-6,-20,24,-10],
// 4 16 -20 24 -10 -16 24 -6 16 24 -6 20 24 -10
  [4,16,-20,24,-10,-16,24,-6,16,24,-6,20,24,-10],
// 4 16 20 24 -10 16 24 -6 16 24 6 20 24 10
  [4,16,20,24,-10,16,24,-6,16,24,6,20,24,10],
// 1 16 0 24 0 20 0 0 0 -24 0 0 0 10 box4t.dat
  [1,16,0,24,0,20,0,0,0,-24,0,0,0,10, ldraw_lib__box4t(realsolid)],
// 1 16 10 0 0 1 0 0 0 1 0 0 0 1 stud.dat
  [1,16,10,0,0,1,0,0,0,1,0,0,0,1, ldraw_lib__stud(realsolid)],
// 1 16 -10 0 0 1 0 0 0 1 0 0 0 1 stud.dat
  [1,16,-10,0,0,1,0,0,0,1,0,0,0,1, ldraw_lib__stud(realsolid)],
// 0
];
module ldraw_lib__s__3004s01(step=0, col=false, unit=2/5, alt=false, line=0.2, solid=!$preview)
    makepoly(ldraw_lib__s__3004s01(solid), step=step, col=col, unit=unit, alt=alt, line=line, solid=solid);
ldraw_lib__s__3004s01(line=0.2);
// file: s/3005s01.scad
use <../../lib.scad>
use <../../p/box4t.scad>
use <../../p/box5.scad>
use <../../p/stud.scad>
$fa=1; $fs=0.2;
function ldraw_lib__s__3005s01(realsolid=false) = [
// 0 ~Brick  1 x  1 without Front Face
// 0 Name: s\3005s01.dat
// 0 Author: John Riley [jriley]
// 0 !LDRAW_ORG Subpart UPDATE 2004-01
// 0 !LICENSE Licensed under CC BY 2.0 and CC BY 4.0 : see CAreadme.txt
// 
// 0 BFC CERTIFY CCW
  [0,"BFC","CERTIFY"],
  [0,"BFC","CCW"],
// 
// 0 !HISTORY 2003-09-07 [jriley] BFCed & Subfiled
// 0 !HISTORY 2004-03-02 [PTadmin] Official Update 2004-01
// 0 !HISTORY 2007-08-29 [PTadmin] Header formatted for Contributor Agreement
// 0 !HISTORY 2008-07-01 [PTadmin] Official Update 2008-01
// 
// 
// 0 BFC INVERTNEXT
  [0,"BFC","INVERTNEXT"],
// 1 16 0 24 0 0 0 6 0 -20 0 -6 0 0 box5.dat
  [1,16,0,24,0,0,0,6,0,-20,0,-6,0,0, ldraw_lib__box5(realsolid)],
// 4 16 10 24 -10 6 24 -6 6 24 6 10 24 10
  [4,16,10,24,-10,6,24,-6,6,24,6,10,24,10],
// 4 16 10 24 10 6 24 6 -6 24 6 -10 24 10
  [4,16,10,24,10,6,24,6,-6,24,6,-10,24,10],
// 4 16 -10 24 10 -6 24 6 -6 24 -6 -10 24 -10
  [4,16,-10,24,10,-6,24,6,-6,24,-6,-10,24,-10],
// 4 16 -10 24 -10 -6 24 -6 6 24 -6 10 24 -10
  [4,16,-10,24,-10,-6,24,-6,6,24,-6,10,24,-10],
// 1 16 0 24 0 10 0 0 0 -24 0 0 0 10 box4t.dat
  [1,16,0,24,0,10,0,0,0,-24,0,0,0,10, ldraw_lib__box4t(realsolid)],
// 1 16 0 0 0 0 0 1 0 1 0 -1 0 0 stud.dat
  [1,16,0,0,0,0,0,1,0,1,0,-1,0,0, ldraw_lib__stud(realsolid)],
// 0
];
module ldraw_lib__s__3005s01(step=0, col=false, unit=2/5, alt=false, line=0.2, solid=!$preview)
    makepoly(ldraw_lib__s__3005s01(solid), step=step, col=col, unit=unit, alt=alt, line=line, solid=solid);
ldraw_lib__s__3005s01(line=0.2);
// file: 3004.scad
use <../lib.scad>
use <s/3004s01.scad>
$fa=1; $fs=0.2;
function ldraw_lib__3004(realsolid=false) = [
// 0 Brick  1 x  2
// 0 Name: 3004.dat
// 0 Author: James Jessiman
// 0 !LDRAW_ORG Part UPDATE 2022-05
// 0 !LICENSE Licensed under CC BY 2.0 and CC BY 4.0 : see CAreadme.txt
// 
// 0 BFC CERTIFY CCW
  [0,"BFC","CERTIFY"],
  [0,"BFC","CCW"],
// 
// 0 !HISTORY 2001-10-26 [PTadmin] Official Update 2001-01
// 0 !HISTORY 2002-05-07 {unknown} BFC Certification
// 0 !HISTORY 2002-06-11 [PTadmin] Official Update 2002-03
// 0 !HISTORY 2007-05-07 [PTadmin] Header formatted for Contributor Agreement
// 0 !HISTORY 2008-07-01 [PTadmin] Official Update 2008-01
// 0 !HISTORY 2022-08-04 [MagFors] Using subfile
// 0 !HISTORY 2022-09-15 [PTadmin] Official Update 2022-05
// 
// 
// 1 16 0 0 0 1 0 0 0 1 0 0 0 1 s\3004s01.dat
  [1,16,0,0,0,1,0,0,0,1,0,0,0,1, ldraw_lib__s__3004s01(realsolid)],
// 4 16 -20 24 -10 20 24 -10 20 0 -10 -20 0 -10
  [4,16,-20,24,-10,20,24,-10,20,0,-10,-20,0,-10],
];
module ldraw_lib__3004(step=0, col=false, unit=2/5, alt=false, line=0.2, solid=!$preview)
    makepoly(ldraw_lib__3004(solid), step=step, col=col, unit=unit, alt=alt, line=line, solid=solid);
ldraw_lib__3004(line=0.2);
// file: 3005ptw.scad
use <../lib.scad>
use <s/3005s01.scad>
$fa=1; $fs=0.2;
function ldraw_lib__3005ptw(realsolid=false) = [
// 0 Brick  1 x  1 with Blue "W" Pattern
// 0 Name: 3005ptw.dat
// 0 Author: Tore Eriksson [Tore_Eriksson]
// 0 !LDRAW_ORG Part UPDATE 2015-01
// 0 !LICENSE Licensed under CC BY 2.0 and CC BY 4.0 : see CAreadme.txt
// 
// 0 BFC CERTIFY CCW
  [0,"BFC","CERTIFY"],
  [0,"BFC","CCW"],
// 
// 0 !HISTORY 2003-12-09 [Steffen] made use of existing subfile
// 0 !HISTORY 2004-04-22 [PTadmin] Official Update 2004-02
// 0 !HISTORY 2007-05-11 [PTadmin] Header formatted for Contributor Agreement
// 0 !HISTORY 2008-07-01 [PTadmin] Official Update 2008-01
// 0 !HISTORY 2014-12-26 [Holly-Wood] Fixed T-Junction, BFCed
// 0 !HISTORY 2015-10-11 [PTadmin] Official Update 2015-01
// 
// 
// 4 1 -3.5 15 -10 -6 5 -10 -8 5 -10 -4.5 19 -10
  [4,1,-3.5,15,-10,-6,5,-10,-8,5,-10,-4.5,19,-10],
// 4 1 -2.5 19 -10 0 11 -10 -3.5 15 -10 -4.5 19 -10
  [4,1,-2.5,19,-10,0,11,-10,-3.5,15,-10,-4.5,19,-10],
// 4 1 -1 5 -10 -3.5 15 -10 0 11 -10 1 5 -10
  [4,1,-1,5,-10,-3.5,15,-10,0,11,-10,1,5,-10],
// 3 1 1 5 -10 0 11 -10 3.55 15 -10
  [3,1,1,5,-10,0,11,-10,3.55,15,-10],
// 4 1 2.5 19 -10 4.5 19 -10 3.55 15 -10 0 11 -10
  [4,1,2.5,19,-10,4.5,19,-10,3.55,15,-10,0,11,-10],
// 4 1 6 5 -10 3.55 15 -10 4.5 19 -10 8 5 -10
  [4,1,6,5,-10,3.55,15,-10,4.5,19,-10,8,5,-10],
// 4 16 -10 24 -10 -4.5 19 -10 -8 5 -10 -10 0 -10
  [4,16,-10,24,-10,-4.5,19,-10,-8,5,-10,-10,0,-10],
// 3 16 -2.5 19 -10 -4.5 19 -10 -10 24 -10
  [3,16,-2.5,19,-10,-4.5,19,-10,-10,24,-10],
// 4 16 2.5 19 -10 -2.5 19 -10 -10 24 -10 10 24 -10
  [4,16,2.5,19,-10,-2.5,19,-10,-10,24,-10,10,24,-10],
// 3 16 4.5 19 -10 2.5 19 -10 10 24 -10
  [3,16,4.5,19,-10,2.5,19,-10,10,24,-10],
// 4 16 8 5 -10 4.5 19 -10 10 24 -10 10 0 -10
  [4,16,8,5,-10,4.5,19,-10,10,24,-10,10,0,-10],
// 3 16 10 0 -10 6 5 -10 8 5 -10
  [3,16,10,0,-10,6,5,-10,8,5,-10],
// 3 16 10 0 -10 1 5 -10 6 5 -10
  [3,16,10,0,-10,1,5,-10,6,5,-10],
// 4 16 -1 5 -10 1 5 -10 10 0 -10 -10 0 -10
  [4,16,-1,5,-10,1,5,-10,10,0,-10,-10,0,-10],
// 3 16 -10 0 -10 -6 5 -10 -1 5 -10
  [3,16,-10,0,-10,-6,5,-10,-1,5,-10],
// 3 16 -10 0 -10 -8 5 -10 -6 5 -10
  [3,16,-10,0,-10,-8,5,-10,-6,5,-10],
// 3 16 -1 5 -10 -6 5 -10 -3.5 15 -10
  [3,16,-1,5,-10,-6,5,-10,-3.5,15,-10],
// 3 16 6 5 -10 1 5 -10 3.55 15 -10
  [3,16,6,5,-10,1,5,-10,3.55,15,-10],
// 3 16 0 11 -10 -2.5 19 -10 2.5 19 -10
  [3,16,0,11,-10,-2.5,19,-10,2.5,19,-10],
// 
// 0 // Subfile
// 1 16 0 0 0 1 0 0 0 1 0 0 0 1 s\3005s01.dat
  [1,16,0,0,0,1,0,0,0,1,0,0,0,1, ldraw_lib__s__3005s01(realsolid)],
];
module ldraw_lib__3005ptw(step=0, col=false, unit=2/5, alt=false, line=0.2, solid=!$preview)
    makepoly(ldraw_lib__3005ptw(solid), step=step, col=col, unit=unit, alt=alt, line=line, solid=solid);
ldraw_lib__3005ptw(line=0.2);
// main file
use <../lib.scad>
use <3005ptw.scad>
$fa=1; $fs=0.2;
function ldraw_lib__3005_w(realsolid=false) = [
// 0 ~Moved to 3005ptw
// 0 Name: 3005-w.dat
// 0 Author: [PTadmin]
// 0 !LDRAW_ORG Part UPDATE 2004-02
// 0 !LICENSE Licensed under CC BY 4.0 : see CAreadme.txt
// 
// 0 BFC CERTIFY CCW
  [0,"BFC","CERTIFY"],
  [0,"BFC","CCW"],
// 
// 0 !HISTORY 1998-12-15 [PTadmin] Official Update 1998-10
// 0 !HISTORY 2004-04-22 [PTadmin] Official Update 2004-02
// 0 !HISTORY 2007-05-11 [PTadmin] Header formatted for Contributor Agreement
// 0 !HISTORY 2008-07-01 [PTadmin] Official Update 2008-01
// 
// 
// 1 16 0 0 0 1 0 0 0 1 0 0 0 1 3005ptw.dat
  [1,16,0,0,0,1,0,0,0,1,0,0,0,1, ldraw_lib__3005ptw(realsolid)],
];
module ldraw_lib__3005_w(step=0, col=false, unit=2/5, alt=false, line=0.2, solid=!$preview)
    makepoly(ldraw_lib__3005_w(solid), step=step, col=col, unit=unit, alt=alt, line=line, solid=solid);
ldraw_lib__3005_w(line=0.2);
